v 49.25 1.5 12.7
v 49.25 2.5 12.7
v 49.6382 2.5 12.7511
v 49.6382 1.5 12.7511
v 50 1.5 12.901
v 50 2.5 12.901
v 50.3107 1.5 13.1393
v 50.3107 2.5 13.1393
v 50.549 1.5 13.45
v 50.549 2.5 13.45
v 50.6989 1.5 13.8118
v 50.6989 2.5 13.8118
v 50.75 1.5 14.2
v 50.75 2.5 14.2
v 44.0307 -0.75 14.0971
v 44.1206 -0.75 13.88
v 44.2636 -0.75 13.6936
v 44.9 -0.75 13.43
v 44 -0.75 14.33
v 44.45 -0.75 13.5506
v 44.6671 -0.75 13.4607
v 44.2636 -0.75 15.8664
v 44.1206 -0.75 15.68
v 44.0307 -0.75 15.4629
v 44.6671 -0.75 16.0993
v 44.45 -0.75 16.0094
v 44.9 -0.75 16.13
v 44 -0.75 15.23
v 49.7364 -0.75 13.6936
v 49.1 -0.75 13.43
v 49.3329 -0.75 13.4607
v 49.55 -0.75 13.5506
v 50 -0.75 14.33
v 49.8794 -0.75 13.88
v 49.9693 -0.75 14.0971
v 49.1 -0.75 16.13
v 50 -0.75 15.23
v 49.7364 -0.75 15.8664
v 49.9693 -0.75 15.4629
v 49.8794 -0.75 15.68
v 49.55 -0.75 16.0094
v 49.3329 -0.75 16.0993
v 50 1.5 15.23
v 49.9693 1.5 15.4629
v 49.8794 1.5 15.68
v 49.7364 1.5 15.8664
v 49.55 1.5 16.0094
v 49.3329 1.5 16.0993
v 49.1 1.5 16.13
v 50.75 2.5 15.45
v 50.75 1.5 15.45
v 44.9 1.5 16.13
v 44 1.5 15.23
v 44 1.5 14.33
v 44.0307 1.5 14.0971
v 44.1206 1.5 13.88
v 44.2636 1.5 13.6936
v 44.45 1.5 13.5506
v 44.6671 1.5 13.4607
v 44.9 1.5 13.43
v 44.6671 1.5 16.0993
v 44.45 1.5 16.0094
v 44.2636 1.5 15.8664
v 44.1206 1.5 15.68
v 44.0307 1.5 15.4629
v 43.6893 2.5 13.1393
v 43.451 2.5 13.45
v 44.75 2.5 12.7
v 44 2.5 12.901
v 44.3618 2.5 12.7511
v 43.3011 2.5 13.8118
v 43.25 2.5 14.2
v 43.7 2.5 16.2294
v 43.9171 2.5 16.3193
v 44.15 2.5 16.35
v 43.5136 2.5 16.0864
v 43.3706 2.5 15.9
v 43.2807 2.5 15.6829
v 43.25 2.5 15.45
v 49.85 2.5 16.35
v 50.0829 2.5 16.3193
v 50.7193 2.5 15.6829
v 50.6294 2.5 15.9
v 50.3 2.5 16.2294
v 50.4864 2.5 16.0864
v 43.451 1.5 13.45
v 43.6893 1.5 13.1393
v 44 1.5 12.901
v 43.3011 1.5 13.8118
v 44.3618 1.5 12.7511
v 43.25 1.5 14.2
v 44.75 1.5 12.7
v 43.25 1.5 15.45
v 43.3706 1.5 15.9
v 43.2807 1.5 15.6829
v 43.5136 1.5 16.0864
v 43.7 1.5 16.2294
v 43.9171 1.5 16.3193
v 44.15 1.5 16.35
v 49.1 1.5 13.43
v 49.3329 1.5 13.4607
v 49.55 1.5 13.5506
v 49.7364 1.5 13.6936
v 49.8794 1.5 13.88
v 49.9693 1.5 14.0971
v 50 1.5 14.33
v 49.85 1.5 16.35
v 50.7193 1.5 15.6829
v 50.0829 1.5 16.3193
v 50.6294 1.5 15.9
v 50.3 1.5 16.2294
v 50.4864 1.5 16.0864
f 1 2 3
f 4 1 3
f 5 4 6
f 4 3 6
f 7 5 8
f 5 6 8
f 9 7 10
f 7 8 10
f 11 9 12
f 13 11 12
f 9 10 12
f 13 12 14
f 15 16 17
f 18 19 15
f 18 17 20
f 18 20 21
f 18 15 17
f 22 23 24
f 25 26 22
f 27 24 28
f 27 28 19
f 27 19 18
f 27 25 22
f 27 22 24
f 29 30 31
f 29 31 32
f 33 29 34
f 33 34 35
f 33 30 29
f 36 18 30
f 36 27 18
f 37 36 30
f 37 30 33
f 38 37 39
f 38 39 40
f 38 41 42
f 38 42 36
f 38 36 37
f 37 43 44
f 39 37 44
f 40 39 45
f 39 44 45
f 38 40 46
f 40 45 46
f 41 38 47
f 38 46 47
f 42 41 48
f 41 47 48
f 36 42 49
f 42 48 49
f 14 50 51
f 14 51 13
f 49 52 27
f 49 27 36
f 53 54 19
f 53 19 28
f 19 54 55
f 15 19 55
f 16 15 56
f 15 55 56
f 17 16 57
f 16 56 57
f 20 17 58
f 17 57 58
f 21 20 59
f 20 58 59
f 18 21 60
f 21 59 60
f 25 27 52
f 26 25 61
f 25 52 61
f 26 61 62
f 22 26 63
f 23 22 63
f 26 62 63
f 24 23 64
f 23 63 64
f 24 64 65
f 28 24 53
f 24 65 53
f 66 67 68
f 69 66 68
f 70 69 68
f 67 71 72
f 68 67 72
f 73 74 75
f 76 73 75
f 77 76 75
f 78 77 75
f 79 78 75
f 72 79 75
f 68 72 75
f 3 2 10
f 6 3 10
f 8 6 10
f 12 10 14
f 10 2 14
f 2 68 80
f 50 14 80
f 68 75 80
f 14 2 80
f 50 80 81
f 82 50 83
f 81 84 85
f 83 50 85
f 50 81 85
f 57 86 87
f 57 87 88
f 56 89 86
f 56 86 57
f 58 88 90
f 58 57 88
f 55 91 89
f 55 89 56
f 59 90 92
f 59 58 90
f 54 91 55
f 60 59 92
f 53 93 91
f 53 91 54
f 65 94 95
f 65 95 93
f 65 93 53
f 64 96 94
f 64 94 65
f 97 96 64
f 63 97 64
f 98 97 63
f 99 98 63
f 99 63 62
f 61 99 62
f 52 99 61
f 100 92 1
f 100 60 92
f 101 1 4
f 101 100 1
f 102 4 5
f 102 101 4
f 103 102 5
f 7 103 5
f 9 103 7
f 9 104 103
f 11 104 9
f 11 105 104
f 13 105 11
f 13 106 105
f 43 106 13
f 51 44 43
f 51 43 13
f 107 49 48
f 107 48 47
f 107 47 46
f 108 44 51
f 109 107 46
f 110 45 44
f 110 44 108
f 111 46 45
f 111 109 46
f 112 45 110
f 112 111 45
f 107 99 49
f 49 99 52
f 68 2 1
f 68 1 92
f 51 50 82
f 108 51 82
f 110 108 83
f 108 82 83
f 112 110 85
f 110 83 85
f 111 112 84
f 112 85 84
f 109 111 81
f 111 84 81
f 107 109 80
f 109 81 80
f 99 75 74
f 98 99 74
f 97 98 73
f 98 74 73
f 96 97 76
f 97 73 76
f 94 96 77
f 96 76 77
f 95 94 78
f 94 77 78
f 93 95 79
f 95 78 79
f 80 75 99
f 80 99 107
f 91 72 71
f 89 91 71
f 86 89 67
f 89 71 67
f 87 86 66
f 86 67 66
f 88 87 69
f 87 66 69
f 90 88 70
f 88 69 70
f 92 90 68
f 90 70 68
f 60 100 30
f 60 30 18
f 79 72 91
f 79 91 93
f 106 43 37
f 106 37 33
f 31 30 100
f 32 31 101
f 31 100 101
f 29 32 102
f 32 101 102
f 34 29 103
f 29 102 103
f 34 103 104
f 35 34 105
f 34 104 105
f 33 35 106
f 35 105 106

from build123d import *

# Parameters (mm, degrees)
EXTRUDE031_DEPTH = 1
EXTRUDE030_DEPTH = 2.75


with BuildPart() as extrude031:
    # Sketch034 → Extrude031 (new body)
    with BuildSketch(Plane.XZ):
        with BuildLine():
            ThreePointArc((11.7, 16.35), (11.063604, 16.086396), (10.8, 15.45))
            Line((10.8, 14.2), (10.8, 15.45))
            ThreePointArc((10.8, 14.2), (11.23934, 13.13934), (12.3, 12.7))
            Line((16.8, 12.7), (12.3, 12.7))
            ThreePointArc((16.8, 12.7), (17.86066, 13.13934), (18.3, 14.2))
            Line((18.3, 15.45), (18.3, 14.2))
            ThreePointArc((18.3, 15.45), (18.036396, 16.086396), (17.4, 16.35))
            Line((11.7, 16.35), (17.4, 16.35))
        make_face()
    extrude(amount=EXTRUDE031_DEPTH)


with BuildPart() as extrude031_1:
    # Extrude031 placement: moved
    add(extrude031.part.moved(Location((0, 2.5, 0))))


with BuildPart() as button002:
    # Sketch033 → Extrude030 (new body)
    with BuildSketch(Plane.XZ):
        with BuildLine():
            ThreePointArc((12.75, 16.23), (12.113604, 15.966396), (11.85, 15.33))
            Line((11.85, 14.43), (11.85, 15.33))
            ThreePointArc((11.85, 14.43), (12.113604, 13.793604), (12.75, 13.53))
            Line((16.95, 13.53), (12.75, 13.53))
            ThreePointArc((16.95, 13.53), (17.586396, 13.793604), (17.85, 14.43))
            Line((17.85, 15.33), (17.85, 14.43))
            ThreePointArc((17.85, 15.33), (17.586396, 15.966396), (16.95, 16.23))
            Line((12.75, 16.23), (16.95, 16.23))
        make_face()
    extrude(amount=EXTRUDE030_DEPTH)


with BuildPart() as button002_1:
    # Extrude030 placement: moved
    add(button002.part.moved(Location((-0.3, 2, -0.1))))

    # Fusion033: union Extrude031
    add(extrude031_1.part)


with BuildPart() as button002_2:
    # Fusion033 placement: moved
    add(button002_1.part.moved(Location((32.45, 0, 0))))


solid = button002_2.part
